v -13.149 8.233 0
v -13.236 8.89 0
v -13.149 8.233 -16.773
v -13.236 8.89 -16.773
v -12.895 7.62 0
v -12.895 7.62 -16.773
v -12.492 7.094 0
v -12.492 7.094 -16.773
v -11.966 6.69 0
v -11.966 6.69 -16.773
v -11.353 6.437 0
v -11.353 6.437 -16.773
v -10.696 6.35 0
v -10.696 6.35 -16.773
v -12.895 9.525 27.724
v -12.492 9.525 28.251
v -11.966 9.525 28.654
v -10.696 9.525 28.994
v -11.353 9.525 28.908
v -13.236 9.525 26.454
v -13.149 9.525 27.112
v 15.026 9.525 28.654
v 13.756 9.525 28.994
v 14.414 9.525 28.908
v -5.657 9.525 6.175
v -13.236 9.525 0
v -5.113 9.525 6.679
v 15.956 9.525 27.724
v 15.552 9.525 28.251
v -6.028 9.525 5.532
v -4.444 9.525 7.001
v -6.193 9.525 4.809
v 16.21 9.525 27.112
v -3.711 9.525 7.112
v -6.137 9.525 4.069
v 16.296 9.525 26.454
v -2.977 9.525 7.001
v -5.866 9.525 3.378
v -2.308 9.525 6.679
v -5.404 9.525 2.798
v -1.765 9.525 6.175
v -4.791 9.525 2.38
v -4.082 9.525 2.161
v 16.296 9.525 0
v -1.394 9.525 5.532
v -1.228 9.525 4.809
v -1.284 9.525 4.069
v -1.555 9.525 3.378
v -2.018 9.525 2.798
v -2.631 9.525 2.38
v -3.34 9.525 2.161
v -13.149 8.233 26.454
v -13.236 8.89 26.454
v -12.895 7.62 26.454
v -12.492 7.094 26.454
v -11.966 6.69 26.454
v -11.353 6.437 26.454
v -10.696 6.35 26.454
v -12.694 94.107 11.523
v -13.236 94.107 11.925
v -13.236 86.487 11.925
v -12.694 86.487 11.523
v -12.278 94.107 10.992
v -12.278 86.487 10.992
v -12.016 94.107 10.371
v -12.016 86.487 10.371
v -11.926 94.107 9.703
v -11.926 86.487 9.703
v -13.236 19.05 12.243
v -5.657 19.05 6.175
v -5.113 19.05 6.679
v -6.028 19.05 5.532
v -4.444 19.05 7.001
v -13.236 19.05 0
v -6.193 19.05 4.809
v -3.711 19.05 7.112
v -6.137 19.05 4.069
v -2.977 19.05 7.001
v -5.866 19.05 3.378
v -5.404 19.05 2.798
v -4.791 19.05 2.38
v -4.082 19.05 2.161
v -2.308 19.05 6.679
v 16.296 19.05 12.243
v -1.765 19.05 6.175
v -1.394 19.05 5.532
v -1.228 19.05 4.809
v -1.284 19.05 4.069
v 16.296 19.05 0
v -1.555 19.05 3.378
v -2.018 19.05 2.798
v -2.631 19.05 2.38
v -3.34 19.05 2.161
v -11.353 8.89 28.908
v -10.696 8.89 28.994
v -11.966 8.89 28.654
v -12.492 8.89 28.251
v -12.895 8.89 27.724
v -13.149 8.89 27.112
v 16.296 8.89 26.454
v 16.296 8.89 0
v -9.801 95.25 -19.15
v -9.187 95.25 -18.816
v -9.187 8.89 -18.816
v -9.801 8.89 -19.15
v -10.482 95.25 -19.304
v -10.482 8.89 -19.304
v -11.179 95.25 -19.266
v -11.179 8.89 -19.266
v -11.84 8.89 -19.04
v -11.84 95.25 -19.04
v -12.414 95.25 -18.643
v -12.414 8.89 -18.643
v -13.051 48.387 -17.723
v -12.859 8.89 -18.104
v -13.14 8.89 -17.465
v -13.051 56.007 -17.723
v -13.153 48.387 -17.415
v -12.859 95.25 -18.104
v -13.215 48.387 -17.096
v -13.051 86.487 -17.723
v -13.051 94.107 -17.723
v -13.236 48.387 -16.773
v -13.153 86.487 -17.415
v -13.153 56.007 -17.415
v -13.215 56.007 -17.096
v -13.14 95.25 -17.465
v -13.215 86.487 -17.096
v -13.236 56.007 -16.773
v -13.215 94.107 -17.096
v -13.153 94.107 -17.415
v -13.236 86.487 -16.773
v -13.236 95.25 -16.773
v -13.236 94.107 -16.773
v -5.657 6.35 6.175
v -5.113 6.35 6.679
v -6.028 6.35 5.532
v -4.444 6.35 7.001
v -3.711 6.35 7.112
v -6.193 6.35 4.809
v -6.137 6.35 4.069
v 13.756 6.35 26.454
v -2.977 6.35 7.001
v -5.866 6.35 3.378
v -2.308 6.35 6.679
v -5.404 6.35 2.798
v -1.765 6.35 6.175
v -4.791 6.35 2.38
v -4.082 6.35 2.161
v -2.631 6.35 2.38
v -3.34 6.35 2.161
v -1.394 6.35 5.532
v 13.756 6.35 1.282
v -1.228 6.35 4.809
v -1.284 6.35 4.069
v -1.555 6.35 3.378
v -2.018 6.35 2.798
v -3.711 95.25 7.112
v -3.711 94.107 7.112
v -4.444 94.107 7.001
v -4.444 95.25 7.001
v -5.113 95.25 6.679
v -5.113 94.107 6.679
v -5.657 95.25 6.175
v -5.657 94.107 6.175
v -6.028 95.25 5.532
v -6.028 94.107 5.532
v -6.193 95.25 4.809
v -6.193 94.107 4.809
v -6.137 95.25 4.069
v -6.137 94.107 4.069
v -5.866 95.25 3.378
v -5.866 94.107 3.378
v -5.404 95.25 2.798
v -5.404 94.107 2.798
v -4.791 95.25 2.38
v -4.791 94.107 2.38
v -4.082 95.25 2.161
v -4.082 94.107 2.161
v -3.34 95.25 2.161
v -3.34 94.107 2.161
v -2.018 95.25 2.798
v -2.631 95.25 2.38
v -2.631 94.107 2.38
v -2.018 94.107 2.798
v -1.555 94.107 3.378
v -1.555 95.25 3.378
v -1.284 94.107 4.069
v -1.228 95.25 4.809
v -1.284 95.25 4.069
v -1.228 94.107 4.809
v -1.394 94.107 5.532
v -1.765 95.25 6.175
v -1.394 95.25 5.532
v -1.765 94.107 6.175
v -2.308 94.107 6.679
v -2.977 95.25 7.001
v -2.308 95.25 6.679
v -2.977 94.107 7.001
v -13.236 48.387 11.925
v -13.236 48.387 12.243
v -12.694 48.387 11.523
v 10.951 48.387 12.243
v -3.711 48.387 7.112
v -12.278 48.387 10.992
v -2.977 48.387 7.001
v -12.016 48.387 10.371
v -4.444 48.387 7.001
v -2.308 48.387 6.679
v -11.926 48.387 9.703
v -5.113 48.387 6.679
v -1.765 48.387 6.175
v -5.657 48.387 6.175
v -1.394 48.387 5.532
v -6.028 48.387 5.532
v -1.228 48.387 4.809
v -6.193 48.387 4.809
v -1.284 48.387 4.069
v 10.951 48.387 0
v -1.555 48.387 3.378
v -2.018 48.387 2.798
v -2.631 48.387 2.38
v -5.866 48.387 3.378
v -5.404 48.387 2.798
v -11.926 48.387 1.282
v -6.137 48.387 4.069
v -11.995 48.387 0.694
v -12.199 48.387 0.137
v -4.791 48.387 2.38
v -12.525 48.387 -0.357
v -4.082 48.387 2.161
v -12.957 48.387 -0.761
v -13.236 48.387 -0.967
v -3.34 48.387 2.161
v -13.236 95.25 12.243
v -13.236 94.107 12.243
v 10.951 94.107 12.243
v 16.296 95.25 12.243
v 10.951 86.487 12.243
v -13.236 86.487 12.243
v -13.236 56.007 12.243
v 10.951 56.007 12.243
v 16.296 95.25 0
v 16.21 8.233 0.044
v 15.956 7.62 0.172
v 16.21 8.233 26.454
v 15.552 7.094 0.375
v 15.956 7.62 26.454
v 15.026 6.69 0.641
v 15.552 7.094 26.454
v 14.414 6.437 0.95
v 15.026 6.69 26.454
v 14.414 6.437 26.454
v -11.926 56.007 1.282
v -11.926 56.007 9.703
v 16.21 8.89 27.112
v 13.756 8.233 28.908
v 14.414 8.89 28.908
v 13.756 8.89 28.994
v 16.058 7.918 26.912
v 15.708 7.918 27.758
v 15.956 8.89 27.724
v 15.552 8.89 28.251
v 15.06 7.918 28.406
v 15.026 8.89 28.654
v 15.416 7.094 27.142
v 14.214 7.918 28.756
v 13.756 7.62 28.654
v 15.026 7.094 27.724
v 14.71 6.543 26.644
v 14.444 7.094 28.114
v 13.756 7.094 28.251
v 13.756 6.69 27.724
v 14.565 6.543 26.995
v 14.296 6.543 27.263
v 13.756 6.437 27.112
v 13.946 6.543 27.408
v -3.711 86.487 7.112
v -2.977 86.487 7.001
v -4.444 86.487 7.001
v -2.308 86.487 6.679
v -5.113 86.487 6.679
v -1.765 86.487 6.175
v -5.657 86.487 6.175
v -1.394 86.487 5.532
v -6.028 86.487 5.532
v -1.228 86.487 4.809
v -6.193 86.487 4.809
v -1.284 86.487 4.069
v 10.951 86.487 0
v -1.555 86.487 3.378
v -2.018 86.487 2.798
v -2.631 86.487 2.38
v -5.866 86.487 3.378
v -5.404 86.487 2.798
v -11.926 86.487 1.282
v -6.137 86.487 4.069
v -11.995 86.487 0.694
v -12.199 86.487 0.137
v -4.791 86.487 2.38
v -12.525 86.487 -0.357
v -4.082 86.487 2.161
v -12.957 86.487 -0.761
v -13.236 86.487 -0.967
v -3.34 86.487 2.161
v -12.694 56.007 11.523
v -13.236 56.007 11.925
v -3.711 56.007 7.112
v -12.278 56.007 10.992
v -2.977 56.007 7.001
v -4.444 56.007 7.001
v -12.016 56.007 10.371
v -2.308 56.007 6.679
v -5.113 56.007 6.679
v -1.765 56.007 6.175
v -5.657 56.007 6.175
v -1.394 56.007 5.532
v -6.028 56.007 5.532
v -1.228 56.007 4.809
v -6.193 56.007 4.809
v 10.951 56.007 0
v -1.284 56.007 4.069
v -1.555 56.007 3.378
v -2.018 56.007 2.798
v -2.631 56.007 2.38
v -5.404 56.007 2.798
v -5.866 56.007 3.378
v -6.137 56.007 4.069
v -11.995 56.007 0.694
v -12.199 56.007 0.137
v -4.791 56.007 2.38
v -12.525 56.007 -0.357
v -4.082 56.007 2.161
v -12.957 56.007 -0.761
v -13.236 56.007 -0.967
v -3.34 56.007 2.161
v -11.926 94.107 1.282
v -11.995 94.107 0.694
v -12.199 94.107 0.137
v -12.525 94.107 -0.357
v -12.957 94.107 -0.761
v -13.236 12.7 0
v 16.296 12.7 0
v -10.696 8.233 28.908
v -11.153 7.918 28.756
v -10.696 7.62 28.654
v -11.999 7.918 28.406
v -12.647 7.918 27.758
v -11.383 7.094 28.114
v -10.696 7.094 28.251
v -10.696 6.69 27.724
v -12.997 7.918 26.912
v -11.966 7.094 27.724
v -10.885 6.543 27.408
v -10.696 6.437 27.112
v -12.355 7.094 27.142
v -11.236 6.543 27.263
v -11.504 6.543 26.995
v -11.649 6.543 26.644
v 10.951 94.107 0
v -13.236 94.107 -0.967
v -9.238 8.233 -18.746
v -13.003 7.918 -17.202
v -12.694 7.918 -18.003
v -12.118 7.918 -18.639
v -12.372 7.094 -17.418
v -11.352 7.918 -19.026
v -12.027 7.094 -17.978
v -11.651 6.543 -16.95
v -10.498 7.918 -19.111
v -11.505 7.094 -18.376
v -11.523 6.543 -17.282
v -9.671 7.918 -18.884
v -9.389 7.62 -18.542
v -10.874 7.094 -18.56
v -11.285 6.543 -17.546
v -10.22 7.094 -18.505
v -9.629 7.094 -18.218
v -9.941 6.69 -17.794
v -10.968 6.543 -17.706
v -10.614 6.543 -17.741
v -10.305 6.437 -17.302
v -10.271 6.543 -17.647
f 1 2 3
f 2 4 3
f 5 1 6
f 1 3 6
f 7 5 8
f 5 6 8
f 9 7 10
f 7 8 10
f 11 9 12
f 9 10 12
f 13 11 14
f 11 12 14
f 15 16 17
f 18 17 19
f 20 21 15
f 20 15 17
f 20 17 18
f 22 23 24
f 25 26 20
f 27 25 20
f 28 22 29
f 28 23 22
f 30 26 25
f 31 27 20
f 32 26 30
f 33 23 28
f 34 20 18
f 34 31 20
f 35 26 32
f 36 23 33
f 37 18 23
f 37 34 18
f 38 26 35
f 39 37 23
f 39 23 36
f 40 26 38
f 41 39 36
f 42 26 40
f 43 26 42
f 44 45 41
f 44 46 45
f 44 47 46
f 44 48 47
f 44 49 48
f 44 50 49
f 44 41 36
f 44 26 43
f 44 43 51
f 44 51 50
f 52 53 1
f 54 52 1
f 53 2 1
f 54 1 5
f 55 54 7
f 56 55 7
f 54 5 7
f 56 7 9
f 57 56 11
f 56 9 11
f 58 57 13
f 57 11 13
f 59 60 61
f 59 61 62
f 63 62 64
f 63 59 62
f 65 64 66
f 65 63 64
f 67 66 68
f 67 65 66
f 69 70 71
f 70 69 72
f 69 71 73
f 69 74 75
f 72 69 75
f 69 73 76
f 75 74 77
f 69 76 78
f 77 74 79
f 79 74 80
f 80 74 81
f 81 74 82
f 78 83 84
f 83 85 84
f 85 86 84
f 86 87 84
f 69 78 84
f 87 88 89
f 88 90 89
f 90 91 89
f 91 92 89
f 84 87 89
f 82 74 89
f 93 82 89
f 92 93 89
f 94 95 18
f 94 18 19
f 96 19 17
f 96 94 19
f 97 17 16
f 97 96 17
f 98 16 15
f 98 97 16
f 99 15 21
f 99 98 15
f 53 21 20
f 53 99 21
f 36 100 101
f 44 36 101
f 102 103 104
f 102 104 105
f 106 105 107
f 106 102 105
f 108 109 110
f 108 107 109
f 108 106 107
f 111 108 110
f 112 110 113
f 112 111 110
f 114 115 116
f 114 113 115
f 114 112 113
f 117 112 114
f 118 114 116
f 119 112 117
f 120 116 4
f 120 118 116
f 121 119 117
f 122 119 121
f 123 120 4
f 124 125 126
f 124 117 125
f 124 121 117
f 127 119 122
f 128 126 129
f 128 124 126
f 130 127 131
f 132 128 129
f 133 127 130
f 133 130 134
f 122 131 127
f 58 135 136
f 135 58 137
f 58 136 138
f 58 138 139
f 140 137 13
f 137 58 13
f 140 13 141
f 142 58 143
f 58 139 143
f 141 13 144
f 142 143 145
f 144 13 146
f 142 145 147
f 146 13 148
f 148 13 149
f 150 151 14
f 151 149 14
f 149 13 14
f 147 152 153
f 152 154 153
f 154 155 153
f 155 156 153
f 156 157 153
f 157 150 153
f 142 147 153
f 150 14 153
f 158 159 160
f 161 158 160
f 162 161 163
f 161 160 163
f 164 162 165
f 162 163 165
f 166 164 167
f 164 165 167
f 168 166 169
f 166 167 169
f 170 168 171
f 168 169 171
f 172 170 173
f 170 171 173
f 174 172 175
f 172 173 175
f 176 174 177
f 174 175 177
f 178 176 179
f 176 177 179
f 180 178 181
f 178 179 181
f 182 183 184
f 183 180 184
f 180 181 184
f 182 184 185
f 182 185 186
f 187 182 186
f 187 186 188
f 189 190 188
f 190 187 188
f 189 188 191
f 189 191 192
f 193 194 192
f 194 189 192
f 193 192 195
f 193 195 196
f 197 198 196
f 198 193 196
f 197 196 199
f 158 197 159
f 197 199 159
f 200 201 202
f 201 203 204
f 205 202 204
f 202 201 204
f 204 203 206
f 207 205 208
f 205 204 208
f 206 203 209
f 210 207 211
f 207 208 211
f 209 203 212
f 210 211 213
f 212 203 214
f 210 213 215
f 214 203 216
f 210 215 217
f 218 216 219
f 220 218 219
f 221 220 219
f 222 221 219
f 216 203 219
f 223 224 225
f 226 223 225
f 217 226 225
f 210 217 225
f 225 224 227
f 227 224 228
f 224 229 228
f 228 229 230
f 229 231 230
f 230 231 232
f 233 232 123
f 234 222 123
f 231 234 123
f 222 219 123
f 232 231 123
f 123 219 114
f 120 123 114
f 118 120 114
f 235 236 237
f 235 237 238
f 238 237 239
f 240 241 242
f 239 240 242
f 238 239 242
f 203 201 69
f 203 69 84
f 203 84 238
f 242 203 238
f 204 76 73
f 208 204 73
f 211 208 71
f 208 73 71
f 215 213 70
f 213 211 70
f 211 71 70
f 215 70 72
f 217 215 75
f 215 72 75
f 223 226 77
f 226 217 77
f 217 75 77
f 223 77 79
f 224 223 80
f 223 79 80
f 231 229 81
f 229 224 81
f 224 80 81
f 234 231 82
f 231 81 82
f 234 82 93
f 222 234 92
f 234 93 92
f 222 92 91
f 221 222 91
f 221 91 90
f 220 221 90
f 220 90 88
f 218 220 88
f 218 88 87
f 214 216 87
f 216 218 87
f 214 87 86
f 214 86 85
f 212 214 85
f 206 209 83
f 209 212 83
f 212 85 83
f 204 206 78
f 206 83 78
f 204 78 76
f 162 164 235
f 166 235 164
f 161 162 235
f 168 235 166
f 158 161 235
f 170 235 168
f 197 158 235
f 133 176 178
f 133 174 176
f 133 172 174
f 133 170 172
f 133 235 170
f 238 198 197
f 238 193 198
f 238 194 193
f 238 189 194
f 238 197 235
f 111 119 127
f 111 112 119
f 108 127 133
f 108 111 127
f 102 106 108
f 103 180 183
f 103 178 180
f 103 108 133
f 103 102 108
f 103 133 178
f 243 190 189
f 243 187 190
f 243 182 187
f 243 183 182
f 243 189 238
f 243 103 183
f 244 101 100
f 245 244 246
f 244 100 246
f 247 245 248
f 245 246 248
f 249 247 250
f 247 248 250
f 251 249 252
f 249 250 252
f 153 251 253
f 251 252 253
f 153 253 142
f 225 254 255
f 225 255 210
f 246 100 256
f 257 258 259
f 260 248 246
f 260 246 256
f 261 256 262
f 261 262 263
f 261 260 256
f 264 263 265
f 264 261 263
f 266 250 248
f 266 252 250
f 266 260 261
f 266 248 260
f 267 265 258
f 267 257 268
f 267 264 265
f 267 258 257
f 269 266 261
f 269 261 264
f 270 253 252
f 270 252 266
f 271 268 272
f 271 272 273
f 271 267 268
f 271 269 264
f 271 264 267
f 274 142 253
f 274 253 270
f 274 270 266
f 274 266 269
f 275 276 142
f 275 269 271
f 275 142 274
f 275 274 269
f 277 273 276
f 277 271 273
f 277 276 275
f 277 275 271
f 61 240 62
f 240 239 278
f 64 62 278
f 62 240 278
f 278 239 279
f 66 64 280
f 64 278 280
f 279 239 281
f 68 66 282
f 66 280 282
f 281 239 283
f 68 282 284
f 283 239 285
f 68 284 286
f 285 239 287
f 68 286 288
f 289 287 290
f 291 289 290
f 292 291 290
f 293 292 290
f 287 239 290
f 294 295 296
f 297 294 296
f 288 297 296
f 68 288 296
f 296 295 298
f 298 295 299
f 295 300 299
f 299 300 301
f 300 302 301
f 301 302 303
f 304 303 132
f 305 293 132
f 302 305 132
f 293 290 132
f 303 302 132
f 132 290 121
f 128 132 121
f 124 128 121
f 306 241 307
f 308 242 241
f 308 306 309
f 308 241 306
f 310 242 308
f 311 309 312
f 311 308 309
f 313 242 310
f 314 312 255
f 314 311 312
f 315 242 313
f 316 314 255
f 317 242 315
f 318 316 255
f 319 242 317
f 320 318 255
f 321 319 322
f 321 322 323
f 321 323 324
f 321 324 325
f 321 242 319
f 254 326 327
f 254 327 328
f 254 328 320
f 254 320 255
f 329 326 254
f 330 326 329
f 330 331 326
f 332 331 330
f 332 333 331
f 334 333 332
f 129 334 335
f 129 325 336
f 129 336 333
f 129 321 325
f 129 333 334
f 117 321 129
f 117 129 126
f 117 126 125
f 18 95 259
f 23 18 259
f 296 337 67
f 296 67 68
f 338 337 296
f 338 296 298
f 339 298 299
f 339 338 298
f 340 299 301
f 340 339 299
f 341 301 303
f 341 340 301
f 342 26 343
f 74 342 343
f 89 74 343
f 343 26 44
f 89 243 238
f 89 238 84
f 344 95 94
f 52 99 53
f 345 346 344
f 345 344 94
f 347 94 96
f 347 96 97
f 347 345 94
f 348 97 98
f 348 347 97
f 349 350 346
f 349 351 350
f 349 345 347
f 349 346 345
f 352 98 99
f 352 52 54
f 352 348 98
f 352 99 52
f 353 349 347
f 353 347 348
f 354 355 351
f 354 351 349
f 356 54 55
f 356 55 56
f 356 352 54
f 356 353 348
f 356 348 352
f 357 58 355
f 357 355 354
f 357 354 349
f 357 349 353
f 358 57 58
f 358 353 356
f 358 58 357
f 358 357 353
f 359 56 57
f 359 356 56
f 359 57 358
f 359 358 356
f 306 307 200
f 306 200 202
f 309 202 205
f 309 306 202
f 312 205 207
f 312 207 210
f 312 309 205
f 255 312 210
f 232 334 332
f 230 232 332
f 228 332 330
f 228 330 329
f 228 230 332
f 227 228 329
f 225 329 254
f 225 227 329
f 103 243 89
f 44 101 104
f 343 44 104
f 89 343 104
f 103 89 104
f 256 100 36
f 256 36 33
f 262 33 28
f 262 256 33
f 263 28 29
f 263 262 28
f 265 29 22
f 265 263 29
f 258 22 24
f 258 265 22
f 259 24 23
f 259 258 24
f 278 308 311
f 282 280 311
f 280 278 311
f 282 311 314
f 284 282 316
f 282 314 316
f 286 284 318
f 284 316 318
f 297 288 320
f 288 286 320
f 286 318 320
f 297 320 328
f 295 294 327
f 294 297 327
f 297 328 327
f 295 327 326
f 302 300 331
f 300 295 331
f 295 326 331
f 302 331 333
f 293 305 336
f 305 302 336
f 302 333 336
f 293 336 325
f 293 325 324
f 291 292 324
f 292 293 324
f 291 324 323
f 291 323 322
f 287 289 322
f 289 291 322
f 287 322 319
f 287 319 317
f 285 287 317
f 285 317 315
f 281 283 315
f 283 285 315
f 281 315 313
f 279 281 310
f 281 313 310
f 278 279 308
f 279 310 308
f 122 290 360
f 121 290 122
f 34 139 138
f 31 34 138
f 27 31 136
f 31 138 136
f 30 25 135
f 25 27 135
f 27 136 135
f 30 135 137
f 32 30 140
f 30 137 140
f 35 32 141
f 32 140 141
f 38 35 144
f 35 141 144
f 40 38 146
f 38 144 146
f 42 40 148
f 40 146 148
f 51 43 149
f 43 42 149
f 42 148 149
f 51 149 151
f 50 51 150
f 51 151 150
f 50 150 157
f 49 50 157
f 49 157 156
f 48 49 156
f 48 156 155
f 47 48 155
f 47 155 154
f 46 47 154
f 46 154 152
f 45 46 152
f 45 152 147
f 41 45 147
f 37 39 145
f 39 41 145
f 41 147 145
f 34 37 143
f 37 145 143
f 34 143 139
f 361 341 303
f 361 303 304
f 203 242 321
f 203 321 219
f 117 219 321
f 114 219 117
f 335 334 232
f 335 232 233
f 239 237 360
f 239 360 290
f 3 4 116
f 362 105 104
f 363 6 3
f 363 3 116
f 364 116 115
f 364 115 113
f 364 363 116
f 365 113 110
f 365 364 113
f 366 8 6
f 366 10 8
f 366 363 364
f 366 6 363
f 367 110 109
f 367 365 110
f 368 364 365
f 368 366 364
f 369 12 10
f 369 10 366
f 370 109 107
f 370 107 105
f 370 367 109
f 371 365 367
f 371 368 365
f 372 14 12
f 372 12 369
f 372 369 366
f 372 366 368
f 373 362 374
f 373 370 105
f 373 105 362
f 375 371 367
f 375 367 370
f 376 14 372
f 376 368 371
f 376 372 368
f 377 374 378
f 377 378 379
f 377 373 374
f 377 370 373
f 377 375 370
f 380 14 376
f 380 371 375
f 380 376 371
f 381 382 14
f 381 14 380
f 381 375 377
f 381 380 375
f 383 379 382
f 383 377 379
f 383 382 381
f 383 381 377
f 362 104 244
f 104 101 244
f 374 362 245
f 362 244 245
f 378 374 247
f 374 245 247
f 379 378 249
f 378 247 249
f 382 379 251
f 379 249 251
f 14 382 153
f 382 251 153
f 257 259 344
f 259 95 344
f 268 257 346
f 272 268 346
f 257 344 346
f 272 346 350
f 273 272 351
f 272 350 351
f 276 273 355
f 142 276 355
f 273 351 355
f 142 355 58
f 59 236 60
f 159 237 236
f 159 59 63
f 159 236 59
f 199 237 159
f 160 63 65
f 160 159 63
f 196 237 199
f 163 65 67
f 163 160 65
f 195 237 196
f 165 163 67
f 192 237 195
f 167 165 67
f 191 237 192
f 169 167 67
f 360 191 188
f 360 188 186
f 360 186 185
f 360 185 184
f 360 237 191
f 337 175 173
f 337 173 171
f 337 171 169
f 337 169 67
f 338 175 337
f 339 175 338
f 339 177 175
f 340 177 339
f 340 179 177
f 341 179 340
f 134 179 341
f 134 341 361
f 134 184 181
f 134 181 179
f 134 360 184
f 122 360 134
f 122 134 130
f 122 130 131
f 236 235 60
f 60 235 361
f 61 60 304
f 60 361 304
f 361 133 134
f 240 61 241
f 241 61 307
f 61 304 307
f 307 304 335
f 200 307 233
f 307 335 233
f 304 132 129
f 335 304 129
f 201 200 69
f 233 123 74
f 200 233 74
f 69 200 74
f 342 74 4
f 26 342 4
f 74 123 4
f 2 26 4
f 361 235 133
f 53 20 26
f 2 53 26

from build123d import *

# Parameters (mm, degrees)
SKETCH1_W               = 29.532117275
SKETCH1_H               = 16.294493356
BOSS_EXTRUDE1_DEPTH     = 6.35
BOSS_EXTRUDE2_DEPTH     = 82.55
SKETCH2_W               = 29.532117275
SKETCH2_H               = 16.294493356
CUT_EXTRUDE1_DEPTH      = 3.175
SKETCH4_W               = 29.532117275
SKETCH4_H               = 12.7
BOSS_EXTRUDE3_DEPTH     = 3.175
SKETCH7_W               = 36.710026843
SKETCH7_H               = 7.62
CUT_EXTRUDE4_DEPTH      = 13.589
SKETCH8_W               = 36.710026843
SKETCH8_H               = 7.62
CUT_EXTRUDE5_DEPTH      = 13.589
SKETCH9_W               = 29.532117275
SKETCH9_H               = 76.2
SKETCH9_W_2             = 22.877365929
SKETCH9_H_2             = 7.62
BOSS_EXTRUDE5_DEPTH     = 12.2428
CUT_EXTRUDE6_DEPTH      = 95.918198917
CUT_EXTRUDE6_DEPTH_BACK = 95.918198917
SKETCH10_R              = 2.4892
FILLET2_R               = 2.54
FILLET3_R               = 2.54


with BuildPart() as part:
    # Sketch1 → Boss-Extrude1 (new body)
    with BuildSketch(Plane(origin=(0, 0, 0), x_dir=(1, 0, 0), z_dir=(0, 1, 0))):
        Polygon((16.296436439, 0), (-13.235680836, 21.805506644), (-13.235680836, 0), align=None)
        with Locations((1.530377802, -8.147246678)):
            Rectangle(SKETCH1_W, SKETCH1_H)
    extrude(amount=BOSS_EXTRUDE1_DEPTH)

    # Sketch1<3> → Boss-Extrude2 (add)
    with BuildSketch(Plane(origin=(0, 0, 0), x_dir=(1, 0, 0), z_dir=(0, 1, 0))):
        Polygon((16.296436439, 0), (-13.235680836, 21.805506644), (-13.235680836, 0), align=None)
    extrude(amount=-BOSS_EXTRUDE2_DEPTH)

    # Sketch2 → Cut-Extrude1 (cut)
    with BuildSketch(Plane(origin=(0, 0, 0), x_dir=(-1, 0, 0), z_dir=(0, -1, 0))):
        with Locations((-1.530377802, -8.147246678)):
            Rectangle(SKETCH2_W, SKETCH2_H)
    extrude(amount=-CUT_EXTRUDE1_DEPTH, mode=Mode.SUBTRACT)

    # Sketch4 → Boss-Extrude3 (add)
    with BuildSketch(Plane(origin=(0, 6.35, 0), x_dir=(1, 0, 0), z_dir=(0, 1, 0))):
        with Locations((1.530377802, -22.644493356)):
            Rectangle(SKETCH4_W, SKETCH4_H)
    extrude(amount=-BOSS_EXTRUDE3_DEPTH)

    # Sketch7 → Cut-Extrude4 (cut)
    with BuildSketch(Plane(origin=(3.863909533, 0, -5.233055638), x_dir=(-0.804470053980136, 0, -0.5939932089251503), z_dir=(0.5939932089251503, 0, -0.804470053980136))):
        with Locations((5.24501832, -77.597)):
            Rectangle(SKETCH7_W, SKETCH7_H)
    extrude(amount=-CUT_EXTRUDE4_DEPTH, mode=Mode.SUBTRACT)

    # Sketch8 → Cut-Extrude5 (cut)
    with BuildSketch(Plane(origin=(3.863909533, 0, -5.233055638), x_dir=(-0.804470053980136, 0, -0.5939932089251503), z_dir=(0.5939932089251503, 0, -0.804470053980136))):
        with Locations((5.24501832, -39.497)):
            Rectangle(SKETCH8_W, SKETCH8_H)
    extrude(amount=-CUT_EXTRUDE5_DEPTH, mode=Mode.SUBTRACT)

    # Sketch9 → Boss-Extrude5 (add)
    with BuildSketch(Plane.XY):
        with Locations((1.530377802, -44.45)):
            Rectangle(SKETCH9_W, SKETCH9_H)
        with Locations((-0.487425481, -77.597)):
            Rectangle(SKETCH9_W_2, SKETCH9_H_2, mode=Mode.SUBTRACT)
        with Locations((-0.487425481, -39.497)):
            Rectangle(SKETCH9_W_2, SKETCH9_H_2, mode=Mode.SUBTRACT)
    extrude(amount=BOSS_EXTRUDE5_DEPTH)

    # Sketch10 → Cut-Extrude6 (cut, two sides: drawn at the far end of the back side and taken through both)
    with BuildSketch(Plane(origin=(0, -82.55, 0), x_dir=(-1, 0, 0), z_dir=(0, -1, 0)).offset(-CUT_EXTRUDE6_DEPTH_BACK)):
        with Locations(Location((3.710680836, -4.6228, 0), (0, 0, 270))):
            Circle(SKETCH10_R)
    extrude(amount=CUT_EXTRUDE6_DEPTH + CUT_EXTRUDE6_DEPTH_BACK, mode=Mode.SUBTRACT)

    # Fillet2
    # the kernel refuses this fillet: 2.54 mm, written as the material it takes off along each edge
    with BuildSketch(Plane(origin=(-13.235680836, -95.13201822, -21.805506644), x_dir=(0.8044700539801357, 0, 0.5939932089251506), z_dir=(0, 1, 0))) as fillet2_piece_1:
        with BuildLine():
            CenterArc((FILLET2_R * 1.98142019214, -FILLET2_R), FILLET2_R, 90, 126.440893479)
            Line((FILLET2_R * 1.17695013816, -FILLET2_R * 1.59399320893), (0, 0))
            Line((0, 0), (FILLET2_R * 1.98142019214, 0))
        make_face()
    extrude(amount=114.06403644, mode=Mode.SUBTRACT)
    with BuildSketch(Plane(origin=(-11.926108446, -81.407, 0), x_dir=(-0.8044700539801358, 0, -0.5939932089251506), z_dir=(0, 1, 0))) as fillet2_piece_2:
        with BuildLine():
            CenterArc((FILLET2_R * 0.504688507753, FILLET2_R), FILLET2_R, 216.440893479, 53.559106521)
            Line((-FILLET2_R * 0.299781546228, FILLET2_R * 0.406006791075), (0, 0))
            Line((0, 0), (FILLET2_R * 0.504688507753, 0))
        make_face()
    extrude(amount=7.62, mode=Mode.SUBTRACT)
    with BuildSketch(Plane(origin=(-11.926108446, -81.407, 12.2428), x_dir=(-1, 0, 0), z_dir=(0, 1, 0)), Plane(origin=(-11.926108446, -43.307, 12.2428), x_dir=(-1, 0, 0), z_dir=(0, 1, 0))) as fillet2_piece_3:
        with BuildLine():
            CenterArc((FILLET2_R, -FILLET2_R), FILLET2_R, 90, 90)
            Line((0, -FILLET2_R), (0, 0))
            Line((0, 0), (FILLET2_R, 0))
        make_face()
    extrude(amount=7.62, mode=Mode.SUBTRACT)
    with BuildSketch(Plane(origin=(-11.926108446, -35.687, 0), x_dir=(-0.8044700539801356, 0, -0.5939932089251507), z_dir=(0, -1, 0))) as fillet2_piece_4:
        with BuildLine():
            CenterArc((FILLET2_R * 0.504688507753, -FILLET2_R), FILLET2_R, 90, 53.559106521)
            Line((-FILLET2_R * 0.299781546228, -FILLET2_R * 0.406006791075), (0, 0))
            Line((0, 0), (FILLET2_R * 0.504688507753, 0))
        make_face()
    extrude(amount=7.62, mode=Mode.SUBTRACT)
    with BuildSketch(Plane(origin=(-13.235680836, 12.7, 28.994493356), x_dir=(0, 0, -1), z_dir=(0, -1, 0))) as fillet2_piece_5:
        with BuildLine():
            CenterArc((FILLET2_R, FILLET2_R), FILLET2_R, 180, 90)
            Line((0, FILLET2_R), (0, 0))
            Line((0, 0), (FILLET2_R, 0))
        make_face()
    extrude(amount=15.875, mode=Mode.SUBTRACT)
    with BuildSketch(Plane(origin=(16.296436439, 12.7, 28.994493356), x_dir=(0, 0, -1), z_dir=(0, -1, 0))) as fillet2_piece_6:
        with BuildLine():
            CenterArc((FILLET2_R, -FILLET2_R), FILLET2_R, 90, 90)
            Line((0, -FILLET2_R), (0, 0))
            Line((0, 0), (FILLET2_R, 0))
        make_face()
    extrude(amount=15.875, mode=Mode.SUBTRACT)

    # Fillet3
    fillet3_edges = [part.edges().sort_by_distance(p)[0] for p in [
        (-13.235680836, 6.35, 4.840897),
        (1.530377801, 6.35, 28.994493356),
        (16.296436439, 6.35, 13.227246678),
        (15.552487663, 6.35, 28.25054458),
        (-12.491732061, 6.35, 28.25054458),
        (-11.840100649, 6.35, -19.04027588),
        (3.554749177, 6.35, -9.408026646),
    ]]
    fillet(fillet3_edges, radius=FILLET3_R)


with BuildPart() as body_2:
    # Mirror1: mirrored copy
    add(part.part.mirror(Plane.ZX.offset(6.35)))


solid = body_2.part
